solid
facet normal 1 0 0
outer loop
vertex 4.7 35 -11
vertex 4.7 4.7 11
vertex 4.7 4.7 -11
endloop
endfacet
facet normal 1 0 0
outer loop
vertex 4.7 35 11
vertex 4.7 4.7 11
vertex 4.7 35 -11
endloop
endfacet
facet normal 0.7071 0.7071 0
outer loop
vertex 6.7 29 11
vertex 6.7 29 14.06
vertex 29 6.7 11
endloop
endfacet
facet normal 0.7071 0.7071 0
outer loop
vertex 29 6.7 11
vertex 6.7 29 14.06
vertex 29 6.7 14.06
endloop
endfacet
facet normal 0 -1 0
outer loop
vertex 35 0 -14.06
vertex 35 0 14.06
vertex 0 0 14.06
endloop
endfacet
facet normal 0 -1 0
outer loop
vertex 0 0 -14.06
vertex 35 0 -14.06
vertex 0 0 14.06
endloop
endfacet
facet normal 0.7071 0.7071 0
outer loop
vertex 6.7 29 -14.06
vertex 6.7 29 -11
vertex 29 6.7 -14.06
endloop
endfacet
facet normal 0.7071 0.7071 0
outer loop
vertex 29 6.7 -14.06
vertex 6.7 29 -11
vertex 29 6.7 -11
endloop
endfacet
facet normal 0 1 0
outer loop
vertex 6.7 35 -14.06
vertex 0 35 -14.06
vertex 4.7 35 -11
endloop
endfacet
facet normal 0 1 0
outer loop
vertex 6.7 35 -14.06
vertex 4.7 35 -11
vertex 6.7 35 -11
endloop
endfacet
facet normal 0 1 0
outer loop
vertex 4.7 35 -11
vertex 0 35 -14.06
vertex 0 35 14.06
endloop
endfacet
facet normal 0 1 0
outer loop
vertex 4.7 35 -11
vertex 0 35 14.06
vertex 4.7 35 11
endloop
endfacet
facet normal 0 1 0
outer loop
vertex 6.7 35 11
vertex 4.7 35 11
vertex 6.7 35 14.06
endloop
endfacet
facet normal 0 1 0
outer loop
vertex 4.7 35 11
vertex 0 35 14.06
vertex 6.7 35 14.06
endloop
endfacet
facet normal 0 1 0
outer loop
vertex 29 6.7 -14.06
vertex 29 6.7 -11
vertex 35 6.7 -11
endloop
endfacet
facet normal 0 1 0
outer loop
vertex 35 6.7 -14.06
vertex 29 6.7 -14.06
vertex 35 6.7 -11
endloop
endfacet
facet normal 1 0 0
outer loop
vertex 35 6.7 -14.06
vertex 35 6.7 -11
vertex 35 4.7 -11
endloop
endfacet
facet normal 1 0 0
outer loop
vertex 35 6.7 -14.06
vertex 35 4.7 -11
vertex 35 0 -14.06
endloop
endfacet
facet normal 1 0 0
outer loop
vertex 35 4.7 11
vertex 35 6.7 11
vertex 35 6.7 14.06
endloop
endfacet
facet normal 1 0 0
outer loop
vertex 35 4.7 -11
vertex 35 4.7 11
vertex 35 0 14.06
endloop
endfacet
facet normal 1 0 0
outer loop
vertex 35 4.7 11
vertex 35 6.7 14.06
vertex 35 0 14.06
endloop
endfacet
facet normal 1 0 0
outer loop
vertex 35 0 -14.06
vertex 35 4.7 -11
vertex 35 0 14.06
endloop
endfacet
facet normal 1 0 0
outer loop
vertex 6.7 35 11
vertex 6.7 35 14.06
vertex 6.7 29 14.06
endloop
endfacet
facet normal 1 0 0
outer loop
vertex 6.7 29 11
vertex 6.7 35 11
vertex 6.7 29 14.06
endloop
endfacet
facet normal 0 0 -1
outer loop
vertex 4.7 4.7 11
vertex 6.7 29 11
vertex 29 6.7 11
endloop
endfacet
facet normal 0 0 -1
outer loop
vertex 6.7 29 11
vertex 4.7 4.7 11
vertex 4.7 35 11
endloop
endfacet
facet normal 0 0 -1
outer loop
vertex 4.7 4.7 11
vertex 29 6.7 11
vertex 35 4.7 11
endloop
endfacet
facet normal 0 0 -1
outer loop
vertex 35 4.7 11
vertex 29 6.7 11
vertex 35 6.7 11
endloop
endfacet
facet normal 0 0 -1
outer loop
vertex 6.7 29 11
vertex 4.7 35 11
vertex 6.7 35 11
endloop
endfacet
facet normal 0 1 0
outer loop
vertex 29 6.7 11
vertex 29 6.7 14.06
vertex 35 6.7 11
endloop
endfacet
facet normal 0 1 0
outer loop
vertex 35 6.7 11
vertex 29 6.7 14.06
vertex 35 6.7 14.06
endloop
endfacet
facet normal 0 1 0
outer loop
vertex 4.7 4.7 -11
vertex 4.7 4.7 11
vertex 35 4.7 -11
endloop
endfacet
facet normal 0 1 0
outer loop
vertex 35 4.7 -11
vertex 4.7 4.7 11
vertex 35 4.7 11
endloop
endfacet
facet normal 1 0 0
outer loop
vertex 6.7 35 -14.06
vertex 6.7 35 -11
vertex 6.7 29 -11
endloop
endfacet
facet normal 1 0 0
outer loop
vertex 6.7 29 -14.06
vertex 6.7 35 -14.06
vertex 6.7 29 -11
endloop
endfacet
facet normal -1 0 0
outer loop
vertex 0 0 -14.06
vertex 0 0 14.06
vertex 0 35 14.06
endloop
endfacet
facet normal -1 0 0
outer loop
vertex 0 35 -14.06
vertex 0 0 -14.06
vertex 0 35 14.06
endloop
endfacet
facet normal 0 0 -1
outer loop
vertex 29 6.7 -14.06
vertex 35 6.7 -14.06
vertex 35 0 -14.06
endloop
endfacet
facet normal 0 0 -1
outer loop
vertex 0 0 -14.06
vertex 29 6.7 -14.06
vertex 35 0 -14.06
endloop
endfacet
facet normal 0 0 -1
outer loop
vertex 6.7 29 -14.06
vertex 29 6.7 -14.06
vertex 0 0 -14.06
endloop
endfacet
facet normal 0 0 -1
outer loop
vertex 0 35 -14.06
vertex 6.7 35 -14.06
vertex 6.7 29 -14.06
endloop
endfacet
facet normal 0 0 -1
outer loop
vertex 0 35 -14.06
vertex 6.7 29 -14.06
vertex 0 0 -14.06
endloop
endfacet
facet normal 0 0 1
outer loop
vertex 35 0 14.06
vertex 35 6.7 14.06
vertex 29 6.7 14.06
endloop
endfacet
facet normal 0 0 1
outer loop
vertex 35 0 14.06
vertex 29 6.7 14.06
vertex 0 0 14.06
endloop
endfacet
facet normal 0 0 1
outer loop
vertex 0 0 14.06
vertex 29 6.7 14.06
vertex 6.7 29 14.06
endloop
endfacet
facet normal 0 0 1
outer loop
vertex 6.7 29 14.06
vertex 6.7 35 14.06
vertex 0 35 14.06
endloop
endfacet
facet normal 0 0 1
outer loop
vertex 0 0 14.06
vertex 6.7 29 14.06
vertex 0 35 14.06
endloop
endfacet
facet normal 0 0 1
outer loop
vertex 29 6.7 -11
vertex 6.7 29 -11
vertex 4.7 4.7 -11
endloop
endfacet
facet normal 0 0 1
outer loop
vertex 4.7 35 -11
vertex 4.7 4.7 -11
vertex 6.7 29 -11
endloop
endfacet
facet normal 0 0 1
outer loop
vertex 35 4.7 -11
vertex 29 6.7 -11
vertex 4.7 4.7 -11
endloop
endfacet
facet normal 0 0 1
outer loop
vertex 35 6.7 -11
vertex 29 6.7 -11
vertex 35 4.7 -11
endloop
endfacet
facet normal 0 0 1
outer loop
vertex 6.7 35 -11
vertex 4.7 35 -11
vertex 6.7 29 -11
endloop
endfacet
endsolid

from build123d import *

# Parameters (mm, degrees)
SALIENTE_EXTRUIR1_DEPTH = 14.06
CROQUIS4_W              = 30.3
CROQUIS4_H              = 30.3
CORTAR_EXTRUIR1_DEPTH   = 11


with BuildPart() as part:
    # Croquis1 → Saliente-Extruir1 (new body, symmetric)
    with BuildSketch(Plane.XY):
        Polygon((0, 0), (0, 35), (6.7, 35), (6.7, 29), (29, 6.7), (35, 6.7), (35, 0), align=None)
    extrude(amount=SALIENTE_EXTRUIR1_DEPTH, both=True)

    # Croquis4 → Cortar-Extruir1 (cut, symmetric)
    with BuildSketch(Plane.XY):
        with Locations((19.85, 19.85)):
            Rectangle(CROQUIS4_W, CROQUIS4_H)
    extrude(amount=CORTAR_EXTRUIR1_DEPTH, both=True, mode=Mode.SUBTRACT)


solid = part.part
